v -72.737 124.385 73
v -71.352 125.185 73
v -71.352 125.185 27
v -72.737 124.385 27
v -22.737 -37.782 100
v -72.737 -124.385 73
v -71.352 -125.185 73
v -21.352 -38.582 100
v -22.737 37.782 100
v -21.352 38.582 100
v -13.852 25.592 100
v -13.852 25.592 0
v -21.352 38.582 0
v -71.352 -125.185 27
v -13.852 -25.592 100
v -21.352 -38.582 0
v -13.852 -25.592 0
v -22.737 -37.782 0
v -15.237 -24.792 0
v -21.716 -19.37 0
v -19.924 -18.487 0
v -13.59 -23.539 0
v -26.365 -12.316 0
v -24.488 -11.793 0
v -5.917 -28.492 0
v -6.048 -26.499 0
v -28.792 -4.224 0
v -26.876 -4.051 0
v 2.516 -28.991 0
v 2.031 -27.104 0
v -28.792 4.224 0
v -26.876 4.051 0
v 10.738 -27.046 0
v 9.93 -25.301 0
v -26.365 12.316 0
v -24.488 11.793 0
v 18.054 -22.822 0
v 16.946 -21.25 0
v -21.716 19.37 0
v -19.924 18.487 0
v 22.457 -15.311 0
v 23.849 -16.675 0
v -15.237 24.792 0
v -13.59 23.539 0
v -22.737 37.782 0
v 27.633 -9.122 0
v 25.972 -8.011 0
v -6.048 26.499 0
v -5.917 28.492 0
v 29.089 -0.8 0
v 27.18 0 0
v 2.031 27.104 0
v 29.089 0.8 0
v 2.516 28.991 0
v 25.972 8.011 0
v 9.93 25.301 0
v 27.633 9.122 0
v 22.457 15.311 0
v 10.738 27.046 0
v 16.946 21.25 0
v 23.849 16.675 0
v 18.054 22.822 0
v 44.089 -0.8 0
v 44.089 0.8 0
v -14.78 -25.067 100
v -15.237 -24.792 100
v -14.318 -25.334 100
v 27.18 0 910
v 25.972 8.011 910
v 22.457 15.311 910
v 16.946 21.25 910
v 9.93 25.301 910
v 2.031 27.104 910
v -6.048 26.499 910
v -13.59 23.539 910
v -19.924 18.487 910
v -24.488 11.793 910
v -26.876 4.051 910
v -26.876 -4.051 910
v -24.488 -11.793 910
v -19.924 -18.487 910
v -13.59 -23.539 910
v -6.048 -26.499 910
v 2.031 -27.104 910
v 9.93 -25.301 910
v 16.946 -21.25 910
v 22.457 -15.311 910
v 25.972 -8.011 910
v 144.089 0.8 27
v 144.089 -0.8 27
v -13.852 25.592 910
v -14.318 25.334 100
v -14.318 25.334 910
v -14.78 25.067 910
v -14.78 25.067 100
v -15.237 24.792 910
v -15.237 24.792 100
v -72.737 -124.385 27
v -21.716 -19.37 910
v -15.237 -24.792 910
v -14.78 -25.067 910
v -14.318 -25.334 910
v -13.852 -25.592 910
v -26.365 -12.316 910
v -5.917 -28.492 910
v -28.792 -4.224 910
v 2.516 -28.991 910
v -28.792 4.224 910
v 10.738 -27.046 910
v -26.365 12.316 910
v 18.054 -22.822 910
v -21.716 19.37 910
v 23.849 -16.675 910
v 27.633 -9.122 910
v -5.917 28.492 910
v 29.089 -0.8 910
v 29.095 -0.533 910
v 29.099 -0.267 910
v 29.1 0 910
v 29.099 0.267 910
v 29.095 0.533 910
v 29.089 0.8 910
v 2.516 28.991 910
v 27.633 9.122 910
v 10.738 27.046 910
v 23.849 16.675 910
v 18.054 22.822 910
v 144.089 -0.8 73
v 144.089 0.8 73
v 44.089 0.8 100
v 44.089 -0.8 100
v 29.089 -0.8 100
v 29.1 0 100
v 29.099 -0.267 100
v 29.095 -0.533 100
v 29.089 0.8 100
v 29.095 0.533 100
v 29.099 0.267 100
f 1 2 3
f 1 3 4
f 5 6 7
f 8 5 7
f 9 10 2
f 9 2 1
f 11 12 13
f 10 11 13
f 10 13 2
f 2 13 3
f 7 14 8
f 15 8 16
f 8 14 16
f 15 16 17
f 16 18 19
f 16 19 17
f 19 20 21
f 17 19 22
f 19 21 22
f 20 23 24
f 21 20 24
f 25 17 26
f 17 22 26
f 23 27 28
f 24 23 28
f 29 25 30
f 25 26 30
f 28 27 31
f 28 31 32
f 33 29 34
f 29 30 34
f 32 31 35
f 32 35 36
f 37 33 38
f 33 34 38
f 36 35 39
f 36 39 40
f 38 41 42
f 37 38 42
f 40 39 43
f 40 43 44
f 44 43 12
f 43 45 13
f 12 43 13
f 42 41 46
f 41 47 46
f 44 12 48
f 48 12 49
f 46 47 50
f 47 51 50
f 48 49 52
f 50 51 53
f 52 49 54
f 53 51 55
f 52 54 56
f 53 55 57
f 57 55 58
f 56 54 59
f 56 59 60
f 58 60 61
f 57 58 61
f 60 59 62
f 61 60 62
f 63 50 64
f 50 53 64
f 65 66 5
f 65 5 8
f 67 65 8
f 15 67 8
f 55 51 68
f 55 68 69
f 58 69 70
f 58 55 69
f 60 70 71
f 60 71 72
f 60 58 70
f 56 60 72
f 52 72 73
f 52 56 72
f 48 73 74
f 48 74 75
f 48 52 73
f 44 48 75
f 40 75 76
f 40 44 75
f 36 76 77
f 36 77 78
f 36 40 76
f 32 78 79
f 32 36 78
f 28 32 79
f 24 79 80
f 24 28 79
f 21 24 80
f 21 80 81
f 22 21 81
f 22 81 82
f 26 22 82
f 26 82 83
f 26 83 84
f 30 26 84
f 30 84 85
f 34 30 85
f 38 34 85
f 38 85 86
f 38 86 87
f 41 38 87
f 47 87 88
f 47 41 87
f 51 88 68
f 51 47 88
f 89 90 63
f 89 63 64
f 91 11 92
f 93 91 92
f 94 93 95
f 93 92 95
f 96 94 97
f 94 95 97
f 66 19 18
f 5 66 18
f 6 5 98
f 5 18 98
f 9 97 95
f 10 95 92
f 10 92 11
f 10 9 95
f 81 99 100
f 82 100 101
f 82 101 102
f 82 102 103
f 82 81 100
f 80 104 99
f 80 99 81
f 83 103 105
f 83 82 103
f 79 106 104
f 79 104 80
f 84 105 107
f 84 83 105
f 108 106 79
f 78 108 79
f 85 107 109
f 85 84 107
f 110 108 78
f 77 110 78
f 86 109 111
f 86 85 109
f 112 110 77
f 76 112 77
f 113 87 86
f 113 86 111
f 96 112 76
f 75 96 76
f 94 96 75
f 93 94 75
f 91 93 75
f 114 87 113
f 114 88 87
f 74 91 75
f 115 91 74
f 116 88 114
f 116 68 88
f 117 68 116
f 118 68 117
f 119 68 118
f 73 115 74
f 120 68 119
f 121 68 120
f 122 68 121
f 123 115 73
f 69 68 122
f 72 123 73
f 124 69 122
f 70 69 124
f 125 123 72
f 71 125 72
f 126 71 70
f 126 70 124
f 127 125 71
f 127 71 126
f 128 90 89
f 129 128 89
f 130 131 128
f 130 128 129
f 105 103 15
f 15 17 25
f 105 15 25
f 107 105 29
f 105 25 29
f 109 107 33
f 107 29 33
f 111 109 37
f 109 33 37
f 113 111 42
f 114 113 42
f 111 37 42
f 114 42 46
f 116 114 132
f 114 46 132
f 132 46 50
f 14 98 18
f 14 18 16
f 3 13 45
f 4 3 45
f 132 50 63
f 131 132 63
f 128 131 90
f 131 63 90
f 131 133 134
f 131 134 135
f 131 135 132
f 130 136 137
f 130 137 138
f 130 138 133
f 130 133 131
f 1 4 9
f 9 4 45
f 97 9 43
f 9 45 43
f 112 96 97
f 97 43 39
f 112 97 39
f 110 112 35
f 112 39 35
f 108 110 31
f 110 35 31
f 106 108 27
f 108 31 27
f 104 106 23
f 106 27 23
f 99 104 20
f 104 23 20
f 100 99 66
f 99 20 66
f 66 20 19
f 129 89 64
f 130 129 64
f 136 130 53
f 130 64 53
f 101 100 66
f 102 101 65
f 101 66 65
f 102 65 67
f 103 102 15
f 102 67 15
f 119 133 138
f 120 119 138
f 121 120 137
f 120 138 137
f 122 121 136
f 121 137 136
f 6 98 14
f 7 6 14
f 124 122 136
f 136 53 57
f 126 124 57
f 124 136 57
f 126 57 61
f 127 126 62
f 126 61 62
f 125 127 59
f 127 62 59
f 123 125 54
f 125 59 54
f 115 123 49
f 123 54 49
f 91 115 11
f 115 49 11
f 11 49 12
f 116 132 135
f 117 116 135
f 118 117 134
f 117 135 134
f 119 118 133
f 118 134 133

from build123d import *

# Parameters (mm, degrees)
F0_R       = 27.18
F1_DEPTH   = 910
F2_DEPTH   = 100
F3_SIZE2   = 100
F3_SIZE    = 27
F3_2_SIZE2 = 100
F3_2_SIZE  = 27
F3_3_SIZE2 = 100
F3_3_SIZE  = 27
F4_SIZE2   = 27
F4_SIZE    = 100


with BuildPart() as f1:
    # F0 (on Top) → F1 (new body)
    with BuildSketch(Plane.XY):
        with BuildLine():
            ThreePointArc((29.0890013579, -0.8), (29.0972502096, -0.4000378014), (29.1, 0))
            ThreePointArc((29.1, 0), (29.0972502096, 0.4000378014), (29.0890013579, 0.8))
            ThreePointArc((29.0890013579, 0.8), (14.55, 25.2013392501), (-13.8516803559, 25.5918141467))
            ThreePointArc((-13.8516803559, 25.5918141467), (-14.55, 25.2013392501), (-15.237321002, 24.7918141467))
            ThreePointArc((-15.237321002, 24.7918141467), (-29.1, 0), (-15.237321002, -24.7918141467))
            ThreePointArc((-15.237321002, -24.7918141467), (-14.55, -25.2013392501), (-13.8516803559, -25.5918141467))
            ThreePointArc((-13.8516803559, -25.5918141467), (14.55, -25.2013392501), (29.0890013579, -0.8))
        make_face()
        Circle(F0_R, mode=Mode.SUBTRACT)
    extrude(amount=F1_DEPTH)

    # F0 (on Top) → F2 (join)
    with BuildSketch(Plane.XY):
        with BuildLine():
            ThreePointArc((29.0890013579, 0.8), (29.0972502096, 0.4000378014), (29.1, 0))
            ThreePointArc((29.1, 0), (29.0972502096, -0.4000378014), (29.0890013579, -0.8))
            Line((29.0890013579, -0.8), (144.0890013579, -0.8))
            Line((144.0890013579, -0.8), (144.0890013579, 0.8))
            Line((144.0890013579, 0.8), (29.0890013579, 0.8))
        make_face()
        with BuildLine():
            Line((-71.3516803559, -125.1847355819), (-13.8516803559, -25.5918141467))
            ThreePointArc((-13.8516803559, -25.5918141467), (-14.55, -25.2013392501), (-15.237321002, -24.7918141467))
            Line((-15.237321002, -24.7918141467), (-72.737321002, -124.3847355819))
            Line((-72.737321002, -124.3847355819), (-71.3516803559, -125.1847355819))
        make_face()
        with BuildLine():
            ThreePointArc((-15.237321002, 24.7918141467), (-14.55, 25.2013392501), (-13.8516803559, 25.5918141467))
            Line((-13.8516803559, 25.5918141467), (-71.3516803559, 125.1847355819))
            Line((-71.3516803559, 125.1847355819), (-72.737321002, 124.3847355819))
            Line((-72.737321002, 124.3847355819), (-15.237321002, 24.7918141467))
        make_face()
    extrude(amount=F2_DEPTH)

    # F3
    f3_edges = [f1.edges().sort_by_distance(p)[0] for p in [
        (-72.044501, -124.784736, 100),
    ]]
    f3_side = f1.faces().sort_by_distance((-72.044501, -124.784736, 50))[0]
    chamfer(f3_edges, length=F3_SIZE, length2=F3_SIZE2, reference=f3_side)

    # F3#2
    f3_2_edges = [f1.edges().sort_by_distance(p)[0] for p in [
        (144.089001, 0, 100),
    ]]
    f3_2_side = f1.faces().sort_by_distance((144.089001, 0, 50))[0]
    chamfer(f3_2_edges, length=F3_2_SIZE, length2=F3_2_SIZE2, reference=f3_2_side)

    # F3#3
    f3_3_edges = [f1.edges().sort_by_distance(p)[0] for p in [
        (-72.044501, 124.784736, 100),
    ]]
    f3_3_side = f1.faces().sort_by_distance((-72.044501, 124.784736, 50))[0]
    chamfer(f3_3_edges, length=F3_3_SIZE, length2=F3_3_SIZE2, reference=f3_3_side)

    # F4
    f4_edges = [f1.edges().sort_by_distance(p)[0] for p in [
        (144.089001, 0, 0),
        (-72.044501, 124.784736, 0),
        (-72.044501, -124.784736, 0),
    ]]
    f4_side = f1.faces().sort_by_distance((-28.768792, 0, 0))[0]
    chamfer(f4_edges, length=F4_SIZE, length2=F4_SIZE2, reference=f4_side)


solid = f1.part
